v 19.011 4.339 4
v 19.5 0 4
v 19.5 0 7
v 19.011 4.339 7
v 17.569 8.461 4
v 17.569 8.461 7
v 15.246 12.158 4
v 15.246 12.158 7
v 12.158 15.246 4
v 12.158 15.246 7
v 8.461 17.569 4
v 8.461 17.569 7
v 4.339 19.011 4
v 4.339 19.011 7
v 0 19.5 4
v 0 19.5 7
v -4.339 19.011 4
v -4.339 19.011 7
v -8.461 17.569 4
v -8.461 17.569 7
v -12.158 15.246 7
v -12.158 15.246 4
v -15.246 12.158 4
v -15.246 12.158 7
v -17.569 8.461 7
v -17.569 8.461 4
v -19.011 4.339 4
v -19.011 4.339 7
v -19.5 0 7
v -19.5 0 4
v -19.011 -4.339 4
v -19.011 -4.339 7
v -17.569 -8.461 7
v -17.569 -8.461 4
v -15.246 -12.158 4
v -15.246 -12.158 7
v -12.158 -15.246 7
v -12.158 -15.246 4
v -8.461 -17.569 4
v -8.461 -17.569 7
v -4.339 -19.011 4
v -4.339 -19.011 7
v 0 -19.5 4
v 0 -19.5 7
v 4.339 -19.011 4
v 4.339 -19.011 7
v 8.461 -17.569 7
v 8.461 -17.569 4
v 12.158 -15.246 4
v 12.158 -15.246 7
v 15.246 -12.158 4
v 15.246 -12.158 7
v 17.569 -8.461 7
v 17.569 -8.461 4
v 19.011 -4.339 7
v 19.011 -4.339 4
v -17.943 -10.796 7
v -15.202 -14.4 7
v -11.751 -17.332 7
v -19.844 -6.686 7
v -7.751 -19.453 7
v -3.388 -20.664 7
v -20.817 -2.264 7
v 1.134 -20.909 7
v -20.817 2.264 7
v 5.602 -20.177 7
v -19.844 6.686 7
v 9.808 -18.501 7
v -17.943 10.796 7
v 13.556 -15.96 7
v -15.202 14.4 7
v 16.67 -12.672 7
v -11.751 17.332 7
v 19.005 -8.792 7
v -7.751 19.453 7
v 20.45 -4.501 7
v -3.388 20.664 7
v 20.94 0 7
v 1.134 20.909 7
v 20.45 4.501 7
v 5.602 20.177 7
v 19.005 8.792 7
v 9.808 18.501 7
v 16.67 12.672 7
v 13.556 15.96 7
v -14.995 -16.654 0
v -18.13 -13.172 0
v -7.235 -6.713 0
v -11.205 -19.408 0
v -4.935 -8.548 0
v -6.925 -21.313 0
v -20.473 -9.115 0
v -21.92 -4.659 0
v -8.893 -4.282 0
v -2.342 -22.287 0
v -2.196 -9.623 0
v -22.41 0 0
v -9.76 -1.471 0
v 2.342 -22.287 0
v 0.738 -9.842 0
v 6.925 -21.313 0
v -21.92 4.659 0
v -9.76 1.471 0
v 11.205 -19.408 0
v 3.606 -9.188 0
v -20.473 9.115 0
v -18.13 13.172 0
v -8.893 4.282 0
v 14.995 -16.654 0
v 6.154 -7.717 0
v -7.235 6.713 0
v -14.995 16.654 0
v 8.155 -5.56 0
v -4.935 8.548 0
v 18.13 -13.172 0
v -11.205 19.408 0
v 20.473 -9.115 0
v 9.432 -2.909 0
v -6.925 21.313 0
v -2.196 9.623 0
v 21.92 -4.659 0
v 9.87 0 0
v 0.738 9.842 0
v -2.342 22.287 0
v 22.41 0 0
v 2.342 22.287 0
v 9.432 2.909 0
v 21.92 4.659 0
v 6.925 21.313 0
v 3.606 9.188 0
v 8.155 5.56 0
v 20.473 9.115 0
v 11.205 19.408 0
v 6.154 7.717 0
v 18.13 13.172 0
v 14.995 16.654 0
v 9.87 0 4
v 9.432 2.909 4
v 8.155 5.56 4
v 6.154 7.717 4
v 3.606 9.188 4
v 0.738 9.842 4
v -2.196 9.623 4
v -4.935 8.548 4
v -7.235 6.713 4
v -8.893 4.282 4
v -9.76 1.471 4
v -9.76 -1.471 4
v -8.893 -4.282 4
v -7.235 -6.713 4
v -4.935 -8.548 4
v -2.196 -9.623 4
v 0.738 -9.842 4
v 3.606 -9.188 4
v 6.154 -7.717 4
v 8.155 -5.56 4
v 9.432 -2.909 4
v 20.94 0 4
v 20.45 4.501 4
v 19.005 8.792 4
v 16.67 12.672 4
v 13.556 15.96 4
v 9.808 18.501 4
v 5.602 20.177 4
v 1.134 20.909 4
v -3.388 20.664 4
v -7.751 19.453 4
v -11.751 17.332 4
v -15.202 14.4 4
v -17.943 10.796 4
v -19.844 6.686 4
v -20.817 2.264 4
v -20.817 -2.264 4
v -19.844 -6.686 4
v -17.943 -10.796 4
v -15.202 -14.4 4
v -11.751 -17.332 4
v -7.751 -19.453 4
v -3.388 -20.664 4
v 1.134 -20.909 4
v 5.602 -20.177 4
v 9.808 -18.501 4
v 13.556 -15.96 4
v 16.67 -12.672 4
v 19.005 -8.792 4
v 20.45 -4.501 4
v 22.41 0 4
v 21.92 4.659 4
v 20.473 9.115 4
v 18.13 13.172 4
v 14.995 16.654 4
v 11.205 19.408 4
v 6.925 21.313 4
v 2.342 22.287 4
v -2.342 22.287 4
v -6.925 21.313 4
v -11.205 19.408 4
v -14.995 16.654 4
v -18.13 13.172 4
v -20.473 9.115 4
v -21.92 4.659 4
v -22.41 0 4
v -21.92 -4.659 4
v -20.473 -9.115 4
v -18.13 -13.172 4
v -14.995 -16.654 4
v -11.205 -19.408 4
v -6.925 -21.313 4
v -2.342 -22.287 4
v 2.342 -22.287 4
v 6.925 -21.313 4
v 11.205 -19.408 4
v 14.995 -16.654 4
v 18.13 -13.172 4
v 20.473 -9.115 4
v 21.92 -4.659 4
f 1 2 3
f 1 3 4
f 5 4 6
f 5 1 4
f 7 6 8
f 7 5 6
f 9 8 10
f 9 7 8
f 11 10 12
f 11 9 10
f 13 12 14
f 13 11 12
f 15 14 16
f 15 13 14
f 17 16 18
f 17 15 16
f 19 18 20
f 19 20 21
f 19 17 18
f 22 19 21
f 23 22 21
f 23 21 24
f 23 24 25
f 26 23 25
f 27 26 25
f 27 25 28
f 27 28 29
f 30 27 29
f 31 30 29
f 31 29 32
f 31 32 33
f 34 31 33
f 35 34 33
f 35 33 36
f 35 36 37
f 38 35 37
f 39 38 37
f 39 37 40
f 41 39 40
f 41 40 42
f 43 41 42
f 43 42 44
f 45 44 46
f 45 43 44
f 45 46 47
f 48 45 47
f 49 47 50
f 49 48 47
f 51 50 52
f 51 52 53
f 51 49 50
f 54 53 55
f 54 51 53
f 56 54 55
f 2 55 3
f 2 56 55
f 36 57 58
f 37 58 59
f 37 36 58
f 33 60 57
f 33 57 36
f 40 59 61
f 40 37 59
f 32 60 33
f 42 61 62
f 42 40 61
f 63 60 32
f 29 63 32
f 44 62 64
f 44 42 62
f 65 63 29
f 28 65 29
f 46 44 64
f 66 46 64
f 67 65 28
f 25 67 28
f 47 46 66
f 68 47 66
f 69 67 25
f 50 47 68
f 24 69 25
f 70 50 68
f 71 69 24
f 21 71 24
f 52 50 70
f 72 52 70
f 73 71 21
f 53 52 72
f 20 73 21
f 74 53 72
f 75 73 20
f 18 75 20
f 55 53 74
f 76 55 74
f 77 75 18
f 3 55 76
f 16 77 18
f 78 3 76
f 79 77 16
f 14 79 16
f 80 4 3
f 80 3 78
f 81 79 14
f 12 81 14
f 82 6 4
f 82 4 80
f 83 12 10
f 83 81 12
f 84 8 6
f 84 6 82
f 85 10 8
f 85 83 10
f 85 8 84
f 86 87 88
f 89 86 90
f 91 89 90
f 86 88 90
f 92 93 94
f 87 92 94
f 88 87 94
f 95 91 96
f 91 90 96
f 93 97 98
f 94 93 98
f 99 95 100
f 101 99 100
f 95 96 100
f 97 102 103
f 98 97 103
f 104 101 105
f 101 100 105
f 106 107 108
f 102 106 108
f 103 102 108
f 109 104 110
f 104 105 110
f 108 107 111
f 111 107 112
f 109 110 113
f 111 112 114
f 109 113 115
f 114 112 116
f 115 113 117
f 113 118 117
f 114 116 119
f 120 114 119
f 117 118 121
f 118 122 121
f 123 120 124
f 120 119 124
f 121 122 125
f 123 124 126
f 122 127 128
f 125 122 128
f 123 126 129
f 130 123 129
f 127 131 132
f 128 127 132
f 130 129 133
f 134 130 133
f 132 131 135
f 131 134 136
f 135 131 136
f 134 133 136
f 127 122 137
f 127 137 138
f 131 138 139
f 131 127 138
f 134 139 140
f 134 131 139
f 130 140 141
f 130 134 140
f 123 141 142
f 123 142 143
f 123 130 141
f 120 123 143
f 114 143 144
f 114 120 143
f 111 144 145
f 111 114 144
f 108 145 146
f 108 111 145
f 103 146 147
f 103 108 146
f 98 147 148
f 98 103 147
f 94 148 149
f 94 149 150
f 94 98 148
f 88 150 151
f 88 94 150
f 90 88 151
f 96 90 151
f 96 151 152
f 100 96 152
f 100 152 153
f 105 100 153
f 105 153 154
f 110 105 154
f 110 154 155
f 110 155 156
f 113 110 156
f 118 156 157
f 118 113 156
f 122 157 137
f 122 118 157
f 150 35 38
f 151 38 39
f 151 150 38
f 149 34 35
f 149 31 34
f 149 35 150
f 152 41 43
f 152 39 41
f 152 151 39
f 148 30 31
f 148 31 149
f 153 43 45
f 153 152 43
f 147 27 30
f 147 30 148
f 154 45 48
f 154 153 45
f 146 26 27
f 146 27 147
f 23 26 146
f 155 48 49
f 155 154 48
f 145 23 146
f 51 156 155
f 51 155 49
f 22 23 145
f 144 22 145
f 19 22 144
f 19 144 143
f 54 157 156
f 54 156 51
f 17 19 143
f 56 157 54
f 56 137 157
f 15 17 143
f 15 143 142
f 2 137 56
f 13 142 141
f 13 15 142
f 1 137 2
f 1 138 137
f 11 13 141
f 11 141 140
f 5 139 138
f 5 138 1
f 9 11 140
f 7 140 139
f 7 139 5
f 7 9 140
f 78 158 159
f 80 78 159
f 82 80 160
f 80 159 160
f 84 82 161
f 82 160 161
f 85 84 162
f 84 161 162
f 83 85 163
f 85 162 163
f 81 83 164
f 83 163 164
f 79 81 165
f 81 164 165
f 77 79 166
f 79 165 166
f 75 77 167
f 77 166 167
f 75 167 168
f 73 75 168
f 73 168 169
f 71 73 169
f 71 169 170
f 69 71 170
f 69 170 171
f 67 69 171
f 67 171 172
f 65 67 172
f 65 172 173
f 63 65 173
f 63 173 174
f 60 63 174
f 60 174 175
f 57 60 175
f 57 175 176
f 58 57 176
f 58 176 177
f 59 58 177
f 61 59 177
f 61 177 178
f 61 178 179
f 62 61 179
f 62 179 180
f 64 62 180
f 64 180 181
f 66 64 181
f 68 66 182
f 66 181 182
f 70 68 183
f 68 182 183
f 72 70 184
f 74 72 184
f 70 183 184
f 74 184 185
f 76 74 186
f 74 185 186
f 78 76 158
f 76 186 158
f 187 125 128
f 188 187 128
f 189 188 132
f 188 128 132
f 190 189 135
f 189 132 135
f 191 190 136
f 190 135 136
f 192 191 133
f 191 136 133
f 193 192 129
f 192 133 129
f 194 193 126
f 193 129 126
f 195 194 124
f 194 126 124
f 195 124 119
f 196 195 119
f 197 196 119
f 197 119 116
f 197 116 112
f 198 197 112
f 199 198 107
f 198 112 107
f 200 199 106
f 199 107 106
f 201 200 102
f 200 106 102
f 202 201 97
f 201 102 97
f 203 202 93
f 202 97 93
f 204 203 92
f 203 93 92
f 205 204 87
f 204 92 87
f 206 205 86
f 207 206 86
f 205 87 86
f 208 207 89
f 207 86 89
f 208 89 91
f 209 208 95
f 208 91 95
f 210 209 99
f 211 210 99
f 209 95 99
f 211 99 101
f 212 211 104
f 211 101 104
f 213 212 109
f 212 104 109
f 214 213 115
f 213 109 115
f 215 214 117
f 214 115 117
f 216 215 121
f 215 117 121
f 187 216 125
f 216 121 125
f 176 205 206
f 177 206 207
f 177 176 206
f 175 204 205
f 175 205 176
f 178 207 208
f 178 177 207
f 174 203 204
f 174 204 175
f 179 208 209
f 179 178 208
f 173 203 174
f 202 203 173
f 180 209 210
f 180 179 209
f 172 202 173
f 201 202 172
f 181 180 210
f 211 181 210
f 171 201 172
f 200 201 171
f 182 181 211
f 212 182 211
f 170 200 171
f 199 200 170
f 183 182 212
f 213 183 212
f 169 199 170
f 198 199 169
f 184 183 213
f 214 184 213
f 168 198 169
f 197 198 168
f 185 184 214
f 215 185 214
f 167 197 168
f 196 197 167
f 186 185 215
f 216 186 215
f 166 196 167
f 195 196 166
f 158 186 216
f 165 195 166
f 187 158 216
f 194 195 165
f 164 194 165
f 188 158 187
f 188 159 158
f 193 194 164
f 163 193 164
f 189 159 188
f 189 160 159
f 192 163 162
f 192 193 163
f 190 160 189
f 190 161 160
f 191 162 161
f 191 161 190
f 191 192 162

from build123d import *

# Parameters (mm, degrees)
F0_R     = 22.41
F0_R_2   = 20.94
F0_R_3   = 19.5
F0_R_4   = 9.87
F1_DEPTH = 4
F2_DEPTH = 7


with BuildPart() as f1:
    # F0 (on Top) → F1 (new body)
    with BuildSketch(Plane.XY):
        Circle(F0_R)
        Circle(F0_R_2, mode=Mode.SUBTRACT)
        Circle(F0_R_2)
        Circle(F0_R_3, mode=Mode.SUBTRACT)
        Circle(F0_R_3)
        Circle(F0_R_4, mode=Mode.SUBTRACT)
    extrude(amount=F1_DEPTH)

    # F0 (on Top) → F2 (join)
    with BuildSketch(Plane.XY):
        Circle(F0_R_2)
        Circle(F0_R_3, mode=Mode.SUBTRACT)
    extrude(amount=F2_DEPTH)


solid = f1.part
